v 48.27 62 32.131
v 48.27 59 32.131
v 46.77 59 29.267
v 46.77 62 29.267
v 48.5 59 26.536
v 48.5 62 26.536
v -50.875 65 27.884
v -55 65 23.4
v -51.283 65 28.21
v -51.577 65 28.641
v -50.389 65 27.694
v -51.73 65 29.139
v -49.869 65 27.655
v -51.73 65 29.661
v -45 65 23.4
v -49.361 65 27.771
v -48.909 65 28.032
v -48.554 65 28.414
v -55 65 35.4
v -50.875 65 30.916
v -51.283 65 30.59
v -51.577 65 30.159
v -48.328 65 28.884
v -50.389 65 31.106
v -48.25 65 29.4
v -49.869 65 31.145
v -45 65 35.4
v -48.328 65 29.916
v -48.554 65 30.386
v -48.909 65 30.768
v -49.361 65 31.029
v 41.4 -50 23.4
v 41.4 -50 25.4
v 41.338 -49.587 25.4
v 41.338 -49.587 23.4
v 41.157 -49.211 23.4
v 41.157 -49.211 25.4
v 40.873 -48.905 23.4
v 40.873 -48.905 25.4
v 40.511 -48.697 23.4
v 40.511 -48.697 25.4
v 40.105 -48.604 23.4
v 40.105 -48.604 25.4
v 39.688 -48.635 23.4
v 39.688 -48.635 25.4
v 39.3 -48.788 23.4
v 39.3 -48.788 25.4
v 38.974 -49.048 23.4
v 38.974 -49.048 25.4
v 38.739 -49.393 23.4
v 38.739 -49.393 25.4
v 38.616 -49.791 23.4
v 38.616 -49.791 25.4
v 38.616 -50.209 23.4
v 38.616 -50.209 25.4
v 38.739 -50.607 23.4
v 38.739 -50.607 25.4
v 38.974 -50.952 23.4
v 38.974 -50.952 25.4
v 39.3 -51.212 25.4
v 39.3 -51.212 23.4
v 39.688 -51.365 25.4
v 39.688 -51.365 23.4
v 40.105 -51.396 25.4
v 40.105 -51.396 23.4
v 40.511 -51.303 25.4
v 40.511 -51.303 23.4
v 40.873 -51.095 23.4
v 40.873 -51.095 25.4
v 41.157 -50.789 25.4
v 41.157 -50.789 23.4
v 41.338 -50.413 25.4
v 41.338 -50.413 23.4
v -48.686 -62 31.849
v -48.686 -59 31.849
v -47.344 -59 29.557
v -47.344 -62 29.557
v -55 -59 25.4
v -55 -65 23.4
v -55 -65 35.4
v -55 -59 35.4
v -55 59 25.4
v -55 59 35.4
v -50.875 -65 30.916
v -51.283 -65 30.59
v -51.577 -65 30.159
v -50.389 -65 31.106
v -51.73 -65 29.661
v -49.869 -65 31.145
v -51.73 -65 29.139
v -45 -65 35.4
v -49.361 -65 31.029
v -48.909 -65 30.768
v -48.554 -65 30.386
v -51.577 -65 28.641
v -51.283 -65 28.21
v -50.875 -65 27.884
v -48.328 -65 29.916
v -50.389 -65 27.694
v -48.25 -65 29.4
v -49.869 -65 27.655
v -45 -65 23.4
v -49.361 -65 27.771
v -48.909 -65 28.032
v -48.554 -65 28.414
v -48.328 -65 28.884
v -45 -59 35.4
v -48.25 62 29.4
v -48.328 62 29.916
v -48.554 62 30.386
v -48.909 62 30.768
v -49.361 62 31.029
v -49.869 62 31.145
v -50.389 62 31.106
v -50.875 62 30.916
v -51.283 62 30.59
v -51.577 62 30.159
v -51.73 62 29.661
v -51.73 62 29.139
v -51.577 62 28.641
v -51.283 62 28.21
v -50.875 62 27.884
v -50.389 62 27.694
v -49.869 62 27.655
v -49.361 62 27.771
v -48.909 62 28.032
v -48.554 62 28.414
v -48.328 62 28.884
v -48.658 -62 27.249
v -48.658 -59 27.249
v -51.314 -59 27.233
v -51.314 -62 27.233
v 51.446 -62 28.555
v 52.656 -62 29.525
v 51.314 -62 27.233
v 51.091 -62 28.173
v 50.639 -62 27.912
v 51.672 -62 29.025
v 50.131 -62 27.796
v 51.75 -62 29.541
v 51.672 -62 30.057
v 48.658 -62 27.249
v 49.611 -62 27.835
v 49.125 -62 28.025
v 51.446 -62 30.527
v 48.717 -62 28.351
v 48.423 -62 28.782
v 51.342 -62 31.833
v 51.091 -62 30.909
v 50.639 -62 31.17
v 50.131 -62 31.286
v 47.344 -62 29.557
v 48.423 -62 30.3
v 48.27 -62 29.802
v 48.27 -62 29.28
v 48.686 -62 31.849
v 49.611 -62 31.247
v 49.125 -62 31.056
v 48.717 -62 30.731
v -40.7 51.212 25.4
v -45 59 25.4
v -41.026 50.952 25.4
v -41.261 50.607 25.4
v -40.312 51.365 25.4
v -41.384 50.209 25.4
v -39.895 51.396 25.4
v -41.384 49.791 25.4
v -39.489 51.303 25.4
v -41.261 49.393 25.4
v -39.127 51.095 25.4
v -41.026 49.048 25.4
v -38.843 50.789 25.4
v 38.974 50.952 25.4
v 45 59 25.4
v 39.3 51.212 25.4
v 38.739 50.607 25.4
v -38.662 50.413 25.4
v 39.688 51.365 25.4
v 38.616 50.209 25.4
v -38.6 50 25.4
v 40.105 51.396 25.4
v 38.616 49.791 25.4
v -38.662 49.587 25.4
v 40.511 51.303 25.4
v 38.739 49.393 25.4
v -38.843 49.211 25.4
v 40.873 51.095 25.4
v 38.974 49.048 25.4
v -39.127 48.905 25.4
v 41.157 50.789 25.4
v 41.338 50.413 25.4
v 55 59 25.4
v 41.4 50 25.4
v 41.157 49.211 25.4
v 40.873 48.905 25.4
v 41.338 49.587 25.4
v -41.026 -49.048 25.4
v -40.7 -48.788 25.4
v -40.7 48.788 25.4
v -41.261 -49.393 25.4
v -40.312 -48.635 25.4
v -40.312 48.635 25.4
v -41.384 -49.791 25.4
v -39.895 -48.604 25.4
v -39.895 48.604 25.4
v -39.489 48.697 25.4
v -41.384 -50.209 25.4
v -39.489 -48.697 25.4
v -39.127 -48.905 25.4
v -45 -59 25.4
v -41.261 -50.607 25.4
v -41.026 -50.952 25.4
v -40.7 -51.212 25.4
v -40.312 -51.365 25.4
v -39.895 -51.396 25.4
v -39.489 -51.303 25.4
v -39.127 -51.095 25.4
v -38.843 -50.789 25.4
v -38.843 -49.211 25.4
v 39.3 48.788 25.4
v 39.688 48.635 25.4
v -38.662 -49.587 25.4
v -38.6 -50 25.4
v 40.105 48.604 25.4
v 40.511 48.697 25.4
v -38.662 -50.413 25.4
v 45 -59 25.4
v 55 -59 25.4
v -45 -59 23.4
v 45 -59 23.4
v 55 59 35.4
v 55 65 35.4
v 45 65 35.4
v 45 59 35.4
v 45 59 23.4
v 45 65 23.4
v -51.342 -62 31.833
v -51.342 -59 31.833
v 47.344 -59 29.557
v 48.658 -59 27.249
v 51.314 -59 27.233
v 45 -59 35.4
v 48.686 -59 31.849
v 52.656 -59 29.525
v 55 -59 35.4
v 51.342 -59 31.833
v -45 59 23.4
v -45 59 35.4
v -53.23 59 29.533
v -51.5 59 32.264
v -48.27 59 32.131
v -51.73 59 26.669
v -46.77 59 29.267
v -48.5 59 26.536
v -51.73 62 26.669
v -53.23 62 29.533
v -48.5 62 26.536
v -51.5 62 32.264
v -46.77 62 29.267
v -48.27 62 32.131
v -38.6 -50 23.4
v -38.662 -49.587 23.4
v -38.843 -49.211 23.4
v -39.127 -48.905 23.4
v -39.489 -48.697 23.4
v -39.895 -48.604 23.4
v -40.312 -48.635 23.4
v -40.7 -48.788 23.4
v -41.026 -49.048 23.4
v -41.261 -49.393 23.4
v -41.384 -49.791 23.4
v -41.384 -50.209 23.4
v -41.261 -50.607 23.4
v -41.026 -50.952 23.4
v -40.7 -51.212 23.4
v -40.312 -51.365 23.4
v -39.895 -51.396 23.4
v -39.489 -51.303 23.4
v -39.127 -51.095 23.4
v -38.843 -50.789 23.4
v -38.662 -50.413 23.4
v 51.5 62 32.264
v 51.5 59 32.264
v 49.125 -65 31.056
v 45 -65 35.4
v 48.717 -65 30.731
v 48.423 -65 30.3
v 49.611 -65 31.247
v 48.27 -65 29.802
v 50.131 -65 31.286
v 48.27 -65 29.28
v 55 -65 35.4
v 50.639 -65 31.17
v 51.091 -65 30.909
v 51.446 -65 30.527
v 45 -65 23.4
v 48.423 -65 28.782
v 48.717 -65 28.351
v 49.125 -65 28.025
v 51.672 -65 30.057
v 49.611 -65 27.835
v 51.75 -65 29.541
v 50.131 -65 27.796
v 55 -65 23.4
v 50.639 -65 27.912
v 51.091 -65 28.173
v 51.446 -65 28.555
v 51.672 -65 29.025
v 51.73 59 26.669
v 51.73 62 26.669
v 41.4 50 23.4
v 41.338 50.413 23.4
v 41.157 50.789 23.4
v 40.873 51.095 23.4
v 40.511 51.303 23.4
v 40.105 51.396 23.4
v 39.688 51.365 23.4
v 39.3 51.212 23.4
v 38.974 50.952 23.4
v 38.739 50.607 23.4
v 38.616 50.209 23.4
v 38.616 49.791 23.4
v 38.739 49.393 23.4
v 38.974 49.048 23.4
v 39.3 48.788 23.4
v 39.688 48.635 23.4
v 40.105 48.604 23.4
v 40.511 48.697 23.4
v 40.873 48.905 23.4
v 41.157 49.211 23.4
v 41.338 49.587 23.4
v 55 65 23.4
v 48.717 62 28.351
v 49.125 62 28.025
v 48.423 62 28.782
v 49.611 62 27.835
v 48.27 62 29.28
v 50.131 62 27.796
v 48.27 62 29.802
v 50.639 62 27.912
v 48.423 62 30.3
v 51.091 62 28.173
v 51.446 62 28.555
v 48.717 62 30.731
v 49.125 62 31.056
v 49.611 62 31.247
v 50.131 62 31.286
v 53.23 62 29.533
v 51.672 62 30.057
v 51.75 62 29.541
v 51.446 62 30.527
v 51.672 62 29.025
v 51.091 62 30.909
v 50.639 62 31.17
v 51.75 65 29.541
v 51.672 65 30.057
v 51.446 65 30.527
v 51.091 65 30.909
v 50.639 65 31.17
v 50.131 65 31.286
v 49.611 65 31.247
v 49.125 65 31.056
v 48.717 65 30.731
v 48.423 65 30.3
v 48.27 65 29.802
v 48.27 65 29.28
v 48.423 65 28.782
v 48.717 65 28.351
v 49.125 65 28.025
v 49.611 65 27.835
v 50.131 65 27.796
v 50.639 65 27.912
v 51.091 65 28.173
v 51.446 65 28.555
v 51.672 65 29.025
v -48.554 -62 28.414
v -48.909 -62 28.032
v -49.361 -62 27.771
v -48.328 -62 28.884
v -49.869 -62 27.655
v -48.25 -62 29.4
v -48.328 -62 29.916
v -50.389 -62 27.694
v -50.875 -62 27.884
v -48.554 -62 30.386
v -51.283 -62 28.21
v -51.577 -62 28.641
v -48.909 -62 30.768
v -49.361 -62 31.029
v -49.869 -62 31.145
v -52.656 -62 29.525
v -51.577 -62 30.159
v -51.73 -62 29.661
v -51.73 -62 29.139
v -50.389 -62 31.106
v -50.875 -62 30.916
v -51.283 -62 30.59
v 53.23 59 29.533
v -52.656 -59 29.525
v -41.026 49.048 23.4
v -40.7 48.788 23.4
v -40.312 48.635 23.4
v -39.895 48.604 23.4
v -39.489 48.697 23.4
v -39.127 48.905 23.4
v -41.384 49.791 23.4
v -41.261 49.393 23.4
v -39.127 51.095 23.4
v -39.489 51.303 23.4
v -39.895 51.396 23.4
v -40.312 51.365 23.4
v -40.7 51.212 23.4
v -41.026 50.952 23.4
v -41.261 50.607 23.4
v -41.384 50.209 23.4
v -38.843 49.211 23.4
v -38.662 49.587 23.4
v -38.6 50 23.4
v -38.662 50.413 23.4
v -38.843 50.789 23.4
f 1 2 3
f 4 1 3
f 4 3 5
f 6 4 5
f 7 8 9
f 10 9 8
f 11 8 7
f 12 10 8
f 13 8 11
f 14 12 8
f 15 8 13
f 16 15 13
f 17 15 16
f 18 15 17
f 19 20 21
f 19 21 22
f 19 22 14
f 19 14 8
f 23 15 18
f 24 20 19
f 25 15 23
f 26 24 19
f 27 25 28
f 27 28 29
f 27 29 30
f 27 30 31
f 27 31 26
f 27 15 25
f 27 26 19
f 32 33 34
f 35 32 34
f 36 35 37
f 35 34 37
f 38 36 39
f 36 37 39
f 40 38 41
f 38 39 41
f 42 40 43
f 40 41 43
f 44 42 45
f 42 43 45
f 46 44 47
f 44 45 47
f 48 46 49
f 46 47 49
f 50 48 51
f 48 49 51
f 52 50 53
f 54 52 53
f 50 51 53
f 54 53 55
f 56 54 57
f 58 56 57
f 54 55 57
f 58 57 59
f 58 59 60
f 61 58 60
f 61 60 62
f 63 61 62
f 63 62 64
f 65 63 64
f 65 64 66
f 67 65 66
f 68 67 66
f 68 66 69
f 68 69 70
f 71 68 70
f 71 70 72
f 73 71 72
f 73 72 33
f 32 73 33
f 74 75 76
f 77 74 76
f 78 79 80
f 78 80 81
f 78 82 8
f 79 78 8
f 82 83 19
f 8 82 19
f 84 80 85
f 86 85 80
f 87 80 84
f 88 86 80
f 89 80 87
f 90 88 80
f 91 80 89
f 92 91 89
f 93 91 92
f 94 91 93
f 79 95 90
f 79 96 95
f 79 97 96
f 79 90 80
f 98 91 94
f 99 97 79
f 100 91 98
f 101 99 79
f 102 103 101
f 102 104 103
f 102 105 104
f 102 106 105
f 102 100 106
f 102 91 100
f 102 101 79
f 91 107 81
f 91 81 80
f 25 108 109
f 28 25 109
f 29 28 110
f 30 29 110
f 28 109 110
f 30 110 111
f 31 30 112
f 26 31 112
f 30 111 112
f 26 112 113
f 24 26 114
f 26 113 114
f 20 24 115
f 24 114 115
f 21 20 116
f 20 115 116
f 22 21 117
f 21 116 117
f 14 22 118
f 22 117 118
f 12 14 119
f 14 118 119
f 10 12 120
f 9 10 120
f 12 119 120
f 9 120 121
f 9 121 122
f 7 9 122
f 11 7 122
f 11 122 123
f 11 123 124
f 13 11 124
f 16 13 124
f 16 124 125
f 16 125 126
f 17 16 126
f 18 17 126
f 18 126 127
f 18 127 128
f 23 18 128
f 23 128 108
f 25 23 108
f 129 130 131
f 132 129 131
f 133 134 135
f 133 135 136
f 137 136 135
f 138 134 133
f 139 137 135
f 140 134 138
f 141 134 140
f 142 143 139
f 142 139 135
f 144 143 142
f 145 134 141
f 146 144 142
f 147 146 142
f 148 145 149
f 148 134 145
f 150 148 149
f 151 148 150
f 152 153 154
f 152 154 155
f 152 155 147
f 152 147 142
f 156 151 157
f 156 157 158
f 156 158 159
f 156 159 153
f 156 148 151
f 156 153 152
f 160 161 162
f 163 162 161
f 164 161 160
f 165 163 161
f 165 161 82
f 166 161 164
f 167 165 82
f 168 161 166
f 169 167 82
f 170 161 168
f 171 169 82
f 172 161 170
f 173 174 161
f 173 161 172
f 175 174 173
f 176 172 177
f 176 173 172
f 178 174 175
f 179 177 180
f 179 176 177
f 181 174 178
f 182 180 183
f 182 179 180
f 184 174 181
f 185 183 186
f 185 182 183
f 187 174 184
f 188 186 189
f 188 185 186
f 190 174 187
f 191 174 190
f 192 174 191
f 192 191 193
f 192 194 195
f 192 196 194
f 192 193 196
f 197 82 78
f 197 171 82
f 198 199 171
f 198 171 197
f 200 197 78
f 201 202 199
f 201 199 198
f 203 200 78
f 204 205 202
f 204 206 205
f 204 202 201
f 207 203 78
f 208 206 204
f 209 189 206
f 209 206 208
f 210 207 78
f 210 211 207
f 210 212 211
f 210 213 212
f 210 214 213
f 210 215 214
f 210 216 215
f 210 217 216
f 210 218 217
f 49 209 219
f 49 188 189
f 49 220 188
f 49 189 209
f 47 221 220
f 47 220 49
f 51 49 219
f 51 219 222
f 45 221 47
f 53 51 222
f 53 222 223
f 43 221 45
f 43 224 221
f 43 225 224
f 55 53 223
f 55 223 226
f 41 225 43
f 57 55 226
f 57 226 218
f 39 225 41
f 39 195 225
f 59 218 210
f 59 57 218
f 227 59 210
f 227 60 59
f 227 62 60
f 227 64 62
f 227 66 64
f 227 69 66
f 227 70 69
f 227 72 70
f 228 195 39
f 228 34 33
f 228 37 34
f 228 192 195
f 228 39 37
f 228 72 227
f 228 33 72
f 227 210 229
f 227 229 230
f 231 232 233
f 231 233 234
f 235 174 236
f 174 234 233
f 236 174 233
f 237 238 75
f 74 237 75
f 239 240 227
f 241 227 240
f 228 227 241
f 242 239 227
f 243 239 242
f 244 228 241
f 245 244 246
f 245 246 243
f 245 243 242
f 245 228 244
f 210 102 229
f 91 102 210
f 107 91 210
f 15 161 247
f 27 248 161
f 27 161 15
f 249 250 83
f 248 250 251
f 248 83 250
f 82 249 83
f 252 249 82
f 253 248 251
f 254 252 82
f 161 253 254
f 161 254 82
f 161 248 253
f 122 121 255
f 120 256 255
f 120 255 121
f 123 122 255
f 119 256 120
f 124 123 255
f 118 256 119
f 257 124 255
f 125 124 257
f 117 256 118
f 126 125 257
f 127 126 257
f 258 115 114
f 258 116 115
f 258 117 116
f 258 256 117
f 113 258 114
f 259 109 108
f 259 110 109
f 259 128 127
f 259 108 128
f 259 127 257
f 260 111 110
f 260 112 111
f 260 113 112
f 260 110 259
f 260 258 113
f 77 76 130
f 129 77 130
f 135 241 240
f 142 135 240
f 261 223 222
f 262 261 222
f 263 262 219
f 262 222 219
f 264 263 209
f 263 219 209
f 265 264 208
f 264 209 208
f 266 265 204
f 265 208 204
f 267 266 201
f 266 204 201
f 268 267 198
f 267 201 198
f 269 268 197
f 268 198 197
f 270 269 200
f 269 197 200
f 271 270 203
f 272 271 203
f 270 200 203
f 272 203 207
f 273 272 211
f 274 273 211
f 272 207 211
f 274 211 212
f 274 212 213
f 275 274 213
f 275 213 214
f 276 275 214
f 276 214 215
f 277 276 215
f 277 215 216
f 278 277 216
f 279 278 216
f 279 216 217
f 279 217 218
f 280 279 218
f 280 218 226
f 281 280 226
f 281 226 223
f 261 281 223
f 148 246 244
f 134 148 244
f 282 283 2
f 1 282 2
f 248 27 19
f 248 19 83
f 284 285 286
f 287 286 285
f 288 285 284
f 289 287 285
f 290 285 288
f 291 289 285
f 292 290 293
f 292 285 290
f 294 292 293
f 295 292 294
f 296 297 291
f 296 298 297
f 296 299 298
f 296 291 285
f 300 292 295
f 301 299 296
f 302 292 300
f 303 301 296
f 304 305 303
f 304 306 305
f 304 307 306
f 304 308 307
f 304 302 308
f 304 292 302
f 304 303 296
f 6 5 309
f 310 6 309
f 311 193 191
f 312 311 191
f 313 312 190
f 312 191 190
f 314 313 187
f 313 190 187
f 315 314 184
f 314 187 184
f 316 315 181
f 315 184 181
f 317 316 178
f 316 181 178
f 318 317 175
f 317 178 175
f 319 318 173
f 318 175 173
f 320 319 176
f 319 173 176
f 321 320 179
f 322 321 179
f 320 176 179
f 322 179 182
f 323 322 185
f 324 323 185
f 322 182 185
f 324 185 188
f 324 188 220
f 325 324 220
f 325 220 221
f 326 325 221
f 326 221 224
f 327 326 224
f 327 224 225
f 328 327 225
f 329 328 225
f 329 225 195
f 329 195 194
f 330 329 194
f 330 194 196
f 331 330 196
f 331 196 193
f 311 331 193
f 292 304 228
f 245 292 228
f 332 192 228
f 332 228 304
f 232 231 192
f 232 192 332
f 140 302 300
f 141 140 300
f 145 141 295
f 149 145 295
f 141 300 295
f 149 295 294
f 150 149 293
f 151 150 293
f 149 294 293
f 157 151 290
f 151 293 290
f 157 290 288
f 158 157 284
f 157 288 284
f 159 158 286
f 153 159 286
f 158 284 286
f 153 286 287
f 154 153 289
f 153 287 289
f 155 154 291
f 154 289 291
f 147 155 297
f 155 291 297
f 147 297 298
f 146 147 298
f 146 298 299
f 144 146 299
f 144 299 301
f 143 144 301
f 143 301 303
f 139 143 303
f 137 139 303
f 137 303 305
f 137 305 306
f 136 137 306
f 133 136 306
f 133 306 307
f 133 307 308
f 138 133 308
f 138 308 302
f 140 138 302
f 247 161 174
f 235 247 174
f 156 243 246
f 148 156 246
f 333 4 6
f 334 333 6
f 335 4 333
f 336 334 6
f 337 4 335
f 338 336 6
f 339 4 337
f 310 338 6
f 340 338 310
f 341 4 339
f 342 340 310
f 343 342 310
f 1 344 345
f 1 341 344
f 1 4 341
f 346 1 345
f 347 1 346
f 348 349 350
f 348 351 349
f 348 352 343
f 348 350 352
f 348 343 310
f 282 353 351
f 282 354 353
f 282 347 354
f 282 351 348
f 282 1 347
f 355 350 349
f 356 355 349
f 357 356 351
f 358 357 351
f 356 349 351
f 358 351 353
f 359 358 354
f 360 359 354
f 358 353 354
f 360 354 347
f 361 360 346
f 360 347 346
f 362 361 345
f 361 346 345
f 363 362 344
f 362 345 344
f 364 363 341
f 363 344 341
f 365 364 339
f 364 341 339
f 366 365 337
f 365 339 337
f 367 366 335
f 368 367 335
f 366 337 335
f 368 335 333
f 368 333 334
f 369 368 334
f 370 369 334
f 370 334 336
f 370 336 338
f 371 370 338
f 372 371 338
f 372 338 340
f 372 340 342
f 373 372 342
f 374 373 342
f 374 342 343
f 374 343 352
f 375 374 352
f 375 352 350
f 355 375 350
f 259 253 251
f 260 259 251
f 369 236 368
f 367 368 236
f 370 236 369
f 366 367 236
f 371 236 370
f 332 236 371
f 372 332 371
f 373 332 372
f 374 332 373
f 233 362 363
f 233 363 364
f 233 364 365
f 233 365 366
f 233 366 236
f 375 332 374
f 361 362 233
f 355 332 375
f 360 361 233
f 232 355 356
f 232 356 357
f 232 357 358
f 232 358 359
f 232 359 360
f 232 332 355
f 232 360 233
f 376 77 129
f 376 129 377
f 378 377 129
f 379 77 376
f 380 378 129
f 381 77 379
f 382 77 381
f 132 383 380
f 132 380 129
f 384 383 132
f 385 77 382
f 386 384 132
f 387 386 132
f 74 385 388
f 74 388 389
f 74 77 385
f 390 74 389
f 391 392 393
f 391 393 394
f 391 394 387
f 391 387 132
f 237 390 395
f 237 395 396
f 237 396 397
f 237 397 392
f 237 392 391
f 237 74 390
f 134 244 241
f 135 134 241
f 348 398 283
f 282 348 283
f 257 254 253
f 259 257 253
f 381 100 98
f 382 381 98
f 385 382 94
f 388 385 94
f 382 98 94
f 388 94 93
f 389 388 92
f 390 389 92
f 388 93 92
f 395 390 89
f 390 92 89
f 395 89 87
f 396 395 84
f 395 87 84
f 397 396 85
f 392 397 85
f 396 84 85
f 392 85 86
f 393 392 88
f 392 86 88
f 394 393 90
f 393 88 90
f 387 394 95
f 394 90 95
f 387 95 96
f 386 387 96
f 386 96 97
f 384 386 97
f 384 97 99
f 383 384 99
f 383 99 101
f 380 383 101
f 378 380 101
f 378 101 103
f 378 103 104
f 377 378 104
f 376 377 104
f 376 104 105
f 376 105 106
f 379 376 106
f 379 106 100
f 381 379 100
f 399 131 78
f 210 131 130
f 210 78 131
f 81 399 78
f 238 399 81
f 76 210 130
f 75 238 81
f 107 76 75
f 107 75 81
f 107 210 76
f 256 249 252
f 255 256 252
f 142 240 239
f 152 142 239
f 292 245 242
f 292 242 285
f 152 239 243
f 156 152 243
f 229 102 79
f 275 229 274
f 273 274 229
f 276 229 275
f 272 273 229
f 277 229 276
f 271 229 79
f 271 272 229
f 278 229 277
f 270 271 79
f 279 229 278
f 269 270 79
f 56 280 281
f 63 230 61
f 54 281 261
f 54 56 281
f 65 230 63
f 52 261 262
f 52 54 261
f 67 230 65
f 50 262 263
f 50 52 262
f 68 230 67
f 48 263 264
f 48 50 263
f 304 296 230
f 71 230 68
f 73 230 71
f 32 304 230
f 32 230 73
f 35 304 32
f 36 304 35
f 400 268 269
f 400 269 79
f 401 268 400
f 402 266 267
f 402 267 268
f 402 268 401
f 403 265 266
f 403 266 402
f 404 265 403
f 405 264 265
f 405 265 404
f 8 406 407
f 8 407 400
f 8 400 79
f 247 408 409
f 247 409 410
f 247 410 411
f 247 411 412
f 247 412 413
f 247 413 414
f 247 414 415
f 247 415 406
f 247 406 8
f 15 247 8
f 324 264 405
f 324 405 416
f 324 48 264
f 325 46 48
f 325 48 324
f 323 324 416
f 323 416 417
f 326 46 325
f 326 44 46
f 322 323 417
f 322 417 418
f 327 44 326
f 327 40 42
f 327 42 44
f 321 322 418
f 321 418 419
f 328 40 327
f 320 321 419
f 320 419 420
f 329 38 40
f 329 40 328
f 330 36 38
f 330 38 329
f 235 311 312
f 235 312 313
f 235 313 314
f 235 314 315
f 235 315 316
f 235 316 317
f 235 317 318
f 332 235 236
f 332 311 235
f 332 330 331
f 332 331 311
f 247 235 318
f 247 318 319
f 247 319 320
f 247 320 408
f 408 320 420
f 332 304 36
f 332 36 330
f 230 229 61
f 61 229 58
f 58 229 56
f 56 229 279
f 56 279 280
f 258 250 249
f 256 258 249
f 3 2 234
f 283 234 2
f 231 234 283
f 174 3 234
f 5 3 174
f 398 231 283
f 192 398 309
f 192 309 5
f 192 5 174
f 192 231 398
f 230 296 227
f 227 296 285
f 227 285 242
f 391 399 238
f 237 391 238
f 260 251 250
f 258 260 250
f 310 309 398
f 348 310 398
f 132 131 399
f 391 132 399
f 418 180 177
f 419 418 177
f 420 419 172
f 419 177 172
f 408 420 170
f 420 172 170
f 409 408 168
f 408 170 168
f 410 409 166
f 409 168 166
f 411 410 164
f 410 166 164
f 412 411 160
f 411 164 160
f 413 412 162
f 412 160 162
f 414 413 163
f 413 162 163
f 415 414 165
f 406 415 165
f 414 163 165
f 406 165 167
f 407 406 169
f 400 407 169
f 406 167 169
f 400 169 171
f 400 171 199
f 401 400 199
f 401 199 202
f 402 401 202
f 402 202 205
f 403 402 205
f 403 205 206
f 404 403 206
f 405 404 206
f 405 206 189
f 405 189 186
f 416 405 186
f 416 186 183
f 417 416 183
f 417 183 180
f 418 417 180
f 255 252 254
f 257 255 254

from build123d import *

# Parameters (mm, degrees)
F1_DEPTH  = 55
F2_W      = 90
F2_H      = 6
F3_DEPTH  = 25
F4_R      = 1.75
F5_DEPTH  = 130.001
F7_DEPTH  = 3
F9_DEPTH  = 3
F10_R     = 1.4
F11_DEPTH = 25


with BuildPart() as f1:
    # F0 (on Right) → F1 (new body, symmetric)
    with BuildSketch(Plane.YZ):
        Polygon((59, 25.4), (0, 25.4), (-59, 25.4), (-59, 35.4), (-65, 35.4), (-65, 23.4), (0, 23.4), (65, 23.4), (65, 35.4), (59, 35.4), align=None)
    extrude(amount=F1_DEPTH, both=True)

    # F2 (on face) → F3 (cut)
    with BuildSketch(Plane.XY.offset(35.4)):
        with Locations((0, 62)):
            Rectangle(F2_W, F2_H)
        with Locations((0, -62)):
            Rectangle(F2_W, F2_H)
    extrude(amount=-F3_DEPTH, mode=Mode.SUBTRACT)

    # F4 (on face) → F5 (cut, through all)
    with BuildSketch(Plane.XZ.offset(65)):
        with Locations((-50, 29.4)):
            Circle(F4_R)
        with Locations((50, 29.5409)):
            Circle(F4_R)
    extrude(amount=-F5_DEPTH, mode=Mode.SUBTRACT)

    # F6 (on face) → F7 (cut)
    with BuildSketch(Plane.XZ.offset(-59)):
        Polygon((-46.769562, 29.267323), (-48.269879, 32.131303), (-51.500317, 32.26398), (-53.230438, 29.532677), (-51.730121, 26.668697), (-48.499683, 26.53602), align=None)
        Polygon((51.730121, 26.668697), (53.230438, 29.532677), (51.500317, 32.26398), (48.269879, 32.131303), (46.769562, 29.267323), (48.499683, 26.53602), align=None)
    extrude(amount=-F7_DEPTH, mode=Mode.SUBTRACT)

    # F8 (on face) → F9 (cut)
    with BuildSketch(Plane(origin=(0, -59, 0), x_dir=(-1, 0, 0), z_dir=(0, 1, 0))):
        Polygon((-47.344236, 29.556816), (-48.685902, 31.848817), (-51.341665, 31.832901), (-52.655764, 29.524984), (-51.314098, 27.232983), (-48.658335, 27.248899), align=None)
        Polygon((51.341665, 31.832901), (48.685902, 31.848817), (47.344236, 29.556816), (48.658335, 27.248899), (51.314098, 27.232983), (52.655764, 29.524984), align=None)
    extrude(amount=-F9_DEPTH, mode=Mode.SUBTRACT)

    # F10 (on face) → F11 (cut)
    with BuildSketch(Plane.XY.offset(25.4)):
        with Locations((-40, 50)):
            Circle(F10_R)
        with Locations((40, 50)):
            Circle(F10_R)
        with Locations((-40, -50)):
            Circle(F10_R)
        with Locations((40, -50)):
            Circle(F10_R)
    extrude(amount=-F11_DEPTH, mode=Mode.SUBTRACT)


solid = f1.part
